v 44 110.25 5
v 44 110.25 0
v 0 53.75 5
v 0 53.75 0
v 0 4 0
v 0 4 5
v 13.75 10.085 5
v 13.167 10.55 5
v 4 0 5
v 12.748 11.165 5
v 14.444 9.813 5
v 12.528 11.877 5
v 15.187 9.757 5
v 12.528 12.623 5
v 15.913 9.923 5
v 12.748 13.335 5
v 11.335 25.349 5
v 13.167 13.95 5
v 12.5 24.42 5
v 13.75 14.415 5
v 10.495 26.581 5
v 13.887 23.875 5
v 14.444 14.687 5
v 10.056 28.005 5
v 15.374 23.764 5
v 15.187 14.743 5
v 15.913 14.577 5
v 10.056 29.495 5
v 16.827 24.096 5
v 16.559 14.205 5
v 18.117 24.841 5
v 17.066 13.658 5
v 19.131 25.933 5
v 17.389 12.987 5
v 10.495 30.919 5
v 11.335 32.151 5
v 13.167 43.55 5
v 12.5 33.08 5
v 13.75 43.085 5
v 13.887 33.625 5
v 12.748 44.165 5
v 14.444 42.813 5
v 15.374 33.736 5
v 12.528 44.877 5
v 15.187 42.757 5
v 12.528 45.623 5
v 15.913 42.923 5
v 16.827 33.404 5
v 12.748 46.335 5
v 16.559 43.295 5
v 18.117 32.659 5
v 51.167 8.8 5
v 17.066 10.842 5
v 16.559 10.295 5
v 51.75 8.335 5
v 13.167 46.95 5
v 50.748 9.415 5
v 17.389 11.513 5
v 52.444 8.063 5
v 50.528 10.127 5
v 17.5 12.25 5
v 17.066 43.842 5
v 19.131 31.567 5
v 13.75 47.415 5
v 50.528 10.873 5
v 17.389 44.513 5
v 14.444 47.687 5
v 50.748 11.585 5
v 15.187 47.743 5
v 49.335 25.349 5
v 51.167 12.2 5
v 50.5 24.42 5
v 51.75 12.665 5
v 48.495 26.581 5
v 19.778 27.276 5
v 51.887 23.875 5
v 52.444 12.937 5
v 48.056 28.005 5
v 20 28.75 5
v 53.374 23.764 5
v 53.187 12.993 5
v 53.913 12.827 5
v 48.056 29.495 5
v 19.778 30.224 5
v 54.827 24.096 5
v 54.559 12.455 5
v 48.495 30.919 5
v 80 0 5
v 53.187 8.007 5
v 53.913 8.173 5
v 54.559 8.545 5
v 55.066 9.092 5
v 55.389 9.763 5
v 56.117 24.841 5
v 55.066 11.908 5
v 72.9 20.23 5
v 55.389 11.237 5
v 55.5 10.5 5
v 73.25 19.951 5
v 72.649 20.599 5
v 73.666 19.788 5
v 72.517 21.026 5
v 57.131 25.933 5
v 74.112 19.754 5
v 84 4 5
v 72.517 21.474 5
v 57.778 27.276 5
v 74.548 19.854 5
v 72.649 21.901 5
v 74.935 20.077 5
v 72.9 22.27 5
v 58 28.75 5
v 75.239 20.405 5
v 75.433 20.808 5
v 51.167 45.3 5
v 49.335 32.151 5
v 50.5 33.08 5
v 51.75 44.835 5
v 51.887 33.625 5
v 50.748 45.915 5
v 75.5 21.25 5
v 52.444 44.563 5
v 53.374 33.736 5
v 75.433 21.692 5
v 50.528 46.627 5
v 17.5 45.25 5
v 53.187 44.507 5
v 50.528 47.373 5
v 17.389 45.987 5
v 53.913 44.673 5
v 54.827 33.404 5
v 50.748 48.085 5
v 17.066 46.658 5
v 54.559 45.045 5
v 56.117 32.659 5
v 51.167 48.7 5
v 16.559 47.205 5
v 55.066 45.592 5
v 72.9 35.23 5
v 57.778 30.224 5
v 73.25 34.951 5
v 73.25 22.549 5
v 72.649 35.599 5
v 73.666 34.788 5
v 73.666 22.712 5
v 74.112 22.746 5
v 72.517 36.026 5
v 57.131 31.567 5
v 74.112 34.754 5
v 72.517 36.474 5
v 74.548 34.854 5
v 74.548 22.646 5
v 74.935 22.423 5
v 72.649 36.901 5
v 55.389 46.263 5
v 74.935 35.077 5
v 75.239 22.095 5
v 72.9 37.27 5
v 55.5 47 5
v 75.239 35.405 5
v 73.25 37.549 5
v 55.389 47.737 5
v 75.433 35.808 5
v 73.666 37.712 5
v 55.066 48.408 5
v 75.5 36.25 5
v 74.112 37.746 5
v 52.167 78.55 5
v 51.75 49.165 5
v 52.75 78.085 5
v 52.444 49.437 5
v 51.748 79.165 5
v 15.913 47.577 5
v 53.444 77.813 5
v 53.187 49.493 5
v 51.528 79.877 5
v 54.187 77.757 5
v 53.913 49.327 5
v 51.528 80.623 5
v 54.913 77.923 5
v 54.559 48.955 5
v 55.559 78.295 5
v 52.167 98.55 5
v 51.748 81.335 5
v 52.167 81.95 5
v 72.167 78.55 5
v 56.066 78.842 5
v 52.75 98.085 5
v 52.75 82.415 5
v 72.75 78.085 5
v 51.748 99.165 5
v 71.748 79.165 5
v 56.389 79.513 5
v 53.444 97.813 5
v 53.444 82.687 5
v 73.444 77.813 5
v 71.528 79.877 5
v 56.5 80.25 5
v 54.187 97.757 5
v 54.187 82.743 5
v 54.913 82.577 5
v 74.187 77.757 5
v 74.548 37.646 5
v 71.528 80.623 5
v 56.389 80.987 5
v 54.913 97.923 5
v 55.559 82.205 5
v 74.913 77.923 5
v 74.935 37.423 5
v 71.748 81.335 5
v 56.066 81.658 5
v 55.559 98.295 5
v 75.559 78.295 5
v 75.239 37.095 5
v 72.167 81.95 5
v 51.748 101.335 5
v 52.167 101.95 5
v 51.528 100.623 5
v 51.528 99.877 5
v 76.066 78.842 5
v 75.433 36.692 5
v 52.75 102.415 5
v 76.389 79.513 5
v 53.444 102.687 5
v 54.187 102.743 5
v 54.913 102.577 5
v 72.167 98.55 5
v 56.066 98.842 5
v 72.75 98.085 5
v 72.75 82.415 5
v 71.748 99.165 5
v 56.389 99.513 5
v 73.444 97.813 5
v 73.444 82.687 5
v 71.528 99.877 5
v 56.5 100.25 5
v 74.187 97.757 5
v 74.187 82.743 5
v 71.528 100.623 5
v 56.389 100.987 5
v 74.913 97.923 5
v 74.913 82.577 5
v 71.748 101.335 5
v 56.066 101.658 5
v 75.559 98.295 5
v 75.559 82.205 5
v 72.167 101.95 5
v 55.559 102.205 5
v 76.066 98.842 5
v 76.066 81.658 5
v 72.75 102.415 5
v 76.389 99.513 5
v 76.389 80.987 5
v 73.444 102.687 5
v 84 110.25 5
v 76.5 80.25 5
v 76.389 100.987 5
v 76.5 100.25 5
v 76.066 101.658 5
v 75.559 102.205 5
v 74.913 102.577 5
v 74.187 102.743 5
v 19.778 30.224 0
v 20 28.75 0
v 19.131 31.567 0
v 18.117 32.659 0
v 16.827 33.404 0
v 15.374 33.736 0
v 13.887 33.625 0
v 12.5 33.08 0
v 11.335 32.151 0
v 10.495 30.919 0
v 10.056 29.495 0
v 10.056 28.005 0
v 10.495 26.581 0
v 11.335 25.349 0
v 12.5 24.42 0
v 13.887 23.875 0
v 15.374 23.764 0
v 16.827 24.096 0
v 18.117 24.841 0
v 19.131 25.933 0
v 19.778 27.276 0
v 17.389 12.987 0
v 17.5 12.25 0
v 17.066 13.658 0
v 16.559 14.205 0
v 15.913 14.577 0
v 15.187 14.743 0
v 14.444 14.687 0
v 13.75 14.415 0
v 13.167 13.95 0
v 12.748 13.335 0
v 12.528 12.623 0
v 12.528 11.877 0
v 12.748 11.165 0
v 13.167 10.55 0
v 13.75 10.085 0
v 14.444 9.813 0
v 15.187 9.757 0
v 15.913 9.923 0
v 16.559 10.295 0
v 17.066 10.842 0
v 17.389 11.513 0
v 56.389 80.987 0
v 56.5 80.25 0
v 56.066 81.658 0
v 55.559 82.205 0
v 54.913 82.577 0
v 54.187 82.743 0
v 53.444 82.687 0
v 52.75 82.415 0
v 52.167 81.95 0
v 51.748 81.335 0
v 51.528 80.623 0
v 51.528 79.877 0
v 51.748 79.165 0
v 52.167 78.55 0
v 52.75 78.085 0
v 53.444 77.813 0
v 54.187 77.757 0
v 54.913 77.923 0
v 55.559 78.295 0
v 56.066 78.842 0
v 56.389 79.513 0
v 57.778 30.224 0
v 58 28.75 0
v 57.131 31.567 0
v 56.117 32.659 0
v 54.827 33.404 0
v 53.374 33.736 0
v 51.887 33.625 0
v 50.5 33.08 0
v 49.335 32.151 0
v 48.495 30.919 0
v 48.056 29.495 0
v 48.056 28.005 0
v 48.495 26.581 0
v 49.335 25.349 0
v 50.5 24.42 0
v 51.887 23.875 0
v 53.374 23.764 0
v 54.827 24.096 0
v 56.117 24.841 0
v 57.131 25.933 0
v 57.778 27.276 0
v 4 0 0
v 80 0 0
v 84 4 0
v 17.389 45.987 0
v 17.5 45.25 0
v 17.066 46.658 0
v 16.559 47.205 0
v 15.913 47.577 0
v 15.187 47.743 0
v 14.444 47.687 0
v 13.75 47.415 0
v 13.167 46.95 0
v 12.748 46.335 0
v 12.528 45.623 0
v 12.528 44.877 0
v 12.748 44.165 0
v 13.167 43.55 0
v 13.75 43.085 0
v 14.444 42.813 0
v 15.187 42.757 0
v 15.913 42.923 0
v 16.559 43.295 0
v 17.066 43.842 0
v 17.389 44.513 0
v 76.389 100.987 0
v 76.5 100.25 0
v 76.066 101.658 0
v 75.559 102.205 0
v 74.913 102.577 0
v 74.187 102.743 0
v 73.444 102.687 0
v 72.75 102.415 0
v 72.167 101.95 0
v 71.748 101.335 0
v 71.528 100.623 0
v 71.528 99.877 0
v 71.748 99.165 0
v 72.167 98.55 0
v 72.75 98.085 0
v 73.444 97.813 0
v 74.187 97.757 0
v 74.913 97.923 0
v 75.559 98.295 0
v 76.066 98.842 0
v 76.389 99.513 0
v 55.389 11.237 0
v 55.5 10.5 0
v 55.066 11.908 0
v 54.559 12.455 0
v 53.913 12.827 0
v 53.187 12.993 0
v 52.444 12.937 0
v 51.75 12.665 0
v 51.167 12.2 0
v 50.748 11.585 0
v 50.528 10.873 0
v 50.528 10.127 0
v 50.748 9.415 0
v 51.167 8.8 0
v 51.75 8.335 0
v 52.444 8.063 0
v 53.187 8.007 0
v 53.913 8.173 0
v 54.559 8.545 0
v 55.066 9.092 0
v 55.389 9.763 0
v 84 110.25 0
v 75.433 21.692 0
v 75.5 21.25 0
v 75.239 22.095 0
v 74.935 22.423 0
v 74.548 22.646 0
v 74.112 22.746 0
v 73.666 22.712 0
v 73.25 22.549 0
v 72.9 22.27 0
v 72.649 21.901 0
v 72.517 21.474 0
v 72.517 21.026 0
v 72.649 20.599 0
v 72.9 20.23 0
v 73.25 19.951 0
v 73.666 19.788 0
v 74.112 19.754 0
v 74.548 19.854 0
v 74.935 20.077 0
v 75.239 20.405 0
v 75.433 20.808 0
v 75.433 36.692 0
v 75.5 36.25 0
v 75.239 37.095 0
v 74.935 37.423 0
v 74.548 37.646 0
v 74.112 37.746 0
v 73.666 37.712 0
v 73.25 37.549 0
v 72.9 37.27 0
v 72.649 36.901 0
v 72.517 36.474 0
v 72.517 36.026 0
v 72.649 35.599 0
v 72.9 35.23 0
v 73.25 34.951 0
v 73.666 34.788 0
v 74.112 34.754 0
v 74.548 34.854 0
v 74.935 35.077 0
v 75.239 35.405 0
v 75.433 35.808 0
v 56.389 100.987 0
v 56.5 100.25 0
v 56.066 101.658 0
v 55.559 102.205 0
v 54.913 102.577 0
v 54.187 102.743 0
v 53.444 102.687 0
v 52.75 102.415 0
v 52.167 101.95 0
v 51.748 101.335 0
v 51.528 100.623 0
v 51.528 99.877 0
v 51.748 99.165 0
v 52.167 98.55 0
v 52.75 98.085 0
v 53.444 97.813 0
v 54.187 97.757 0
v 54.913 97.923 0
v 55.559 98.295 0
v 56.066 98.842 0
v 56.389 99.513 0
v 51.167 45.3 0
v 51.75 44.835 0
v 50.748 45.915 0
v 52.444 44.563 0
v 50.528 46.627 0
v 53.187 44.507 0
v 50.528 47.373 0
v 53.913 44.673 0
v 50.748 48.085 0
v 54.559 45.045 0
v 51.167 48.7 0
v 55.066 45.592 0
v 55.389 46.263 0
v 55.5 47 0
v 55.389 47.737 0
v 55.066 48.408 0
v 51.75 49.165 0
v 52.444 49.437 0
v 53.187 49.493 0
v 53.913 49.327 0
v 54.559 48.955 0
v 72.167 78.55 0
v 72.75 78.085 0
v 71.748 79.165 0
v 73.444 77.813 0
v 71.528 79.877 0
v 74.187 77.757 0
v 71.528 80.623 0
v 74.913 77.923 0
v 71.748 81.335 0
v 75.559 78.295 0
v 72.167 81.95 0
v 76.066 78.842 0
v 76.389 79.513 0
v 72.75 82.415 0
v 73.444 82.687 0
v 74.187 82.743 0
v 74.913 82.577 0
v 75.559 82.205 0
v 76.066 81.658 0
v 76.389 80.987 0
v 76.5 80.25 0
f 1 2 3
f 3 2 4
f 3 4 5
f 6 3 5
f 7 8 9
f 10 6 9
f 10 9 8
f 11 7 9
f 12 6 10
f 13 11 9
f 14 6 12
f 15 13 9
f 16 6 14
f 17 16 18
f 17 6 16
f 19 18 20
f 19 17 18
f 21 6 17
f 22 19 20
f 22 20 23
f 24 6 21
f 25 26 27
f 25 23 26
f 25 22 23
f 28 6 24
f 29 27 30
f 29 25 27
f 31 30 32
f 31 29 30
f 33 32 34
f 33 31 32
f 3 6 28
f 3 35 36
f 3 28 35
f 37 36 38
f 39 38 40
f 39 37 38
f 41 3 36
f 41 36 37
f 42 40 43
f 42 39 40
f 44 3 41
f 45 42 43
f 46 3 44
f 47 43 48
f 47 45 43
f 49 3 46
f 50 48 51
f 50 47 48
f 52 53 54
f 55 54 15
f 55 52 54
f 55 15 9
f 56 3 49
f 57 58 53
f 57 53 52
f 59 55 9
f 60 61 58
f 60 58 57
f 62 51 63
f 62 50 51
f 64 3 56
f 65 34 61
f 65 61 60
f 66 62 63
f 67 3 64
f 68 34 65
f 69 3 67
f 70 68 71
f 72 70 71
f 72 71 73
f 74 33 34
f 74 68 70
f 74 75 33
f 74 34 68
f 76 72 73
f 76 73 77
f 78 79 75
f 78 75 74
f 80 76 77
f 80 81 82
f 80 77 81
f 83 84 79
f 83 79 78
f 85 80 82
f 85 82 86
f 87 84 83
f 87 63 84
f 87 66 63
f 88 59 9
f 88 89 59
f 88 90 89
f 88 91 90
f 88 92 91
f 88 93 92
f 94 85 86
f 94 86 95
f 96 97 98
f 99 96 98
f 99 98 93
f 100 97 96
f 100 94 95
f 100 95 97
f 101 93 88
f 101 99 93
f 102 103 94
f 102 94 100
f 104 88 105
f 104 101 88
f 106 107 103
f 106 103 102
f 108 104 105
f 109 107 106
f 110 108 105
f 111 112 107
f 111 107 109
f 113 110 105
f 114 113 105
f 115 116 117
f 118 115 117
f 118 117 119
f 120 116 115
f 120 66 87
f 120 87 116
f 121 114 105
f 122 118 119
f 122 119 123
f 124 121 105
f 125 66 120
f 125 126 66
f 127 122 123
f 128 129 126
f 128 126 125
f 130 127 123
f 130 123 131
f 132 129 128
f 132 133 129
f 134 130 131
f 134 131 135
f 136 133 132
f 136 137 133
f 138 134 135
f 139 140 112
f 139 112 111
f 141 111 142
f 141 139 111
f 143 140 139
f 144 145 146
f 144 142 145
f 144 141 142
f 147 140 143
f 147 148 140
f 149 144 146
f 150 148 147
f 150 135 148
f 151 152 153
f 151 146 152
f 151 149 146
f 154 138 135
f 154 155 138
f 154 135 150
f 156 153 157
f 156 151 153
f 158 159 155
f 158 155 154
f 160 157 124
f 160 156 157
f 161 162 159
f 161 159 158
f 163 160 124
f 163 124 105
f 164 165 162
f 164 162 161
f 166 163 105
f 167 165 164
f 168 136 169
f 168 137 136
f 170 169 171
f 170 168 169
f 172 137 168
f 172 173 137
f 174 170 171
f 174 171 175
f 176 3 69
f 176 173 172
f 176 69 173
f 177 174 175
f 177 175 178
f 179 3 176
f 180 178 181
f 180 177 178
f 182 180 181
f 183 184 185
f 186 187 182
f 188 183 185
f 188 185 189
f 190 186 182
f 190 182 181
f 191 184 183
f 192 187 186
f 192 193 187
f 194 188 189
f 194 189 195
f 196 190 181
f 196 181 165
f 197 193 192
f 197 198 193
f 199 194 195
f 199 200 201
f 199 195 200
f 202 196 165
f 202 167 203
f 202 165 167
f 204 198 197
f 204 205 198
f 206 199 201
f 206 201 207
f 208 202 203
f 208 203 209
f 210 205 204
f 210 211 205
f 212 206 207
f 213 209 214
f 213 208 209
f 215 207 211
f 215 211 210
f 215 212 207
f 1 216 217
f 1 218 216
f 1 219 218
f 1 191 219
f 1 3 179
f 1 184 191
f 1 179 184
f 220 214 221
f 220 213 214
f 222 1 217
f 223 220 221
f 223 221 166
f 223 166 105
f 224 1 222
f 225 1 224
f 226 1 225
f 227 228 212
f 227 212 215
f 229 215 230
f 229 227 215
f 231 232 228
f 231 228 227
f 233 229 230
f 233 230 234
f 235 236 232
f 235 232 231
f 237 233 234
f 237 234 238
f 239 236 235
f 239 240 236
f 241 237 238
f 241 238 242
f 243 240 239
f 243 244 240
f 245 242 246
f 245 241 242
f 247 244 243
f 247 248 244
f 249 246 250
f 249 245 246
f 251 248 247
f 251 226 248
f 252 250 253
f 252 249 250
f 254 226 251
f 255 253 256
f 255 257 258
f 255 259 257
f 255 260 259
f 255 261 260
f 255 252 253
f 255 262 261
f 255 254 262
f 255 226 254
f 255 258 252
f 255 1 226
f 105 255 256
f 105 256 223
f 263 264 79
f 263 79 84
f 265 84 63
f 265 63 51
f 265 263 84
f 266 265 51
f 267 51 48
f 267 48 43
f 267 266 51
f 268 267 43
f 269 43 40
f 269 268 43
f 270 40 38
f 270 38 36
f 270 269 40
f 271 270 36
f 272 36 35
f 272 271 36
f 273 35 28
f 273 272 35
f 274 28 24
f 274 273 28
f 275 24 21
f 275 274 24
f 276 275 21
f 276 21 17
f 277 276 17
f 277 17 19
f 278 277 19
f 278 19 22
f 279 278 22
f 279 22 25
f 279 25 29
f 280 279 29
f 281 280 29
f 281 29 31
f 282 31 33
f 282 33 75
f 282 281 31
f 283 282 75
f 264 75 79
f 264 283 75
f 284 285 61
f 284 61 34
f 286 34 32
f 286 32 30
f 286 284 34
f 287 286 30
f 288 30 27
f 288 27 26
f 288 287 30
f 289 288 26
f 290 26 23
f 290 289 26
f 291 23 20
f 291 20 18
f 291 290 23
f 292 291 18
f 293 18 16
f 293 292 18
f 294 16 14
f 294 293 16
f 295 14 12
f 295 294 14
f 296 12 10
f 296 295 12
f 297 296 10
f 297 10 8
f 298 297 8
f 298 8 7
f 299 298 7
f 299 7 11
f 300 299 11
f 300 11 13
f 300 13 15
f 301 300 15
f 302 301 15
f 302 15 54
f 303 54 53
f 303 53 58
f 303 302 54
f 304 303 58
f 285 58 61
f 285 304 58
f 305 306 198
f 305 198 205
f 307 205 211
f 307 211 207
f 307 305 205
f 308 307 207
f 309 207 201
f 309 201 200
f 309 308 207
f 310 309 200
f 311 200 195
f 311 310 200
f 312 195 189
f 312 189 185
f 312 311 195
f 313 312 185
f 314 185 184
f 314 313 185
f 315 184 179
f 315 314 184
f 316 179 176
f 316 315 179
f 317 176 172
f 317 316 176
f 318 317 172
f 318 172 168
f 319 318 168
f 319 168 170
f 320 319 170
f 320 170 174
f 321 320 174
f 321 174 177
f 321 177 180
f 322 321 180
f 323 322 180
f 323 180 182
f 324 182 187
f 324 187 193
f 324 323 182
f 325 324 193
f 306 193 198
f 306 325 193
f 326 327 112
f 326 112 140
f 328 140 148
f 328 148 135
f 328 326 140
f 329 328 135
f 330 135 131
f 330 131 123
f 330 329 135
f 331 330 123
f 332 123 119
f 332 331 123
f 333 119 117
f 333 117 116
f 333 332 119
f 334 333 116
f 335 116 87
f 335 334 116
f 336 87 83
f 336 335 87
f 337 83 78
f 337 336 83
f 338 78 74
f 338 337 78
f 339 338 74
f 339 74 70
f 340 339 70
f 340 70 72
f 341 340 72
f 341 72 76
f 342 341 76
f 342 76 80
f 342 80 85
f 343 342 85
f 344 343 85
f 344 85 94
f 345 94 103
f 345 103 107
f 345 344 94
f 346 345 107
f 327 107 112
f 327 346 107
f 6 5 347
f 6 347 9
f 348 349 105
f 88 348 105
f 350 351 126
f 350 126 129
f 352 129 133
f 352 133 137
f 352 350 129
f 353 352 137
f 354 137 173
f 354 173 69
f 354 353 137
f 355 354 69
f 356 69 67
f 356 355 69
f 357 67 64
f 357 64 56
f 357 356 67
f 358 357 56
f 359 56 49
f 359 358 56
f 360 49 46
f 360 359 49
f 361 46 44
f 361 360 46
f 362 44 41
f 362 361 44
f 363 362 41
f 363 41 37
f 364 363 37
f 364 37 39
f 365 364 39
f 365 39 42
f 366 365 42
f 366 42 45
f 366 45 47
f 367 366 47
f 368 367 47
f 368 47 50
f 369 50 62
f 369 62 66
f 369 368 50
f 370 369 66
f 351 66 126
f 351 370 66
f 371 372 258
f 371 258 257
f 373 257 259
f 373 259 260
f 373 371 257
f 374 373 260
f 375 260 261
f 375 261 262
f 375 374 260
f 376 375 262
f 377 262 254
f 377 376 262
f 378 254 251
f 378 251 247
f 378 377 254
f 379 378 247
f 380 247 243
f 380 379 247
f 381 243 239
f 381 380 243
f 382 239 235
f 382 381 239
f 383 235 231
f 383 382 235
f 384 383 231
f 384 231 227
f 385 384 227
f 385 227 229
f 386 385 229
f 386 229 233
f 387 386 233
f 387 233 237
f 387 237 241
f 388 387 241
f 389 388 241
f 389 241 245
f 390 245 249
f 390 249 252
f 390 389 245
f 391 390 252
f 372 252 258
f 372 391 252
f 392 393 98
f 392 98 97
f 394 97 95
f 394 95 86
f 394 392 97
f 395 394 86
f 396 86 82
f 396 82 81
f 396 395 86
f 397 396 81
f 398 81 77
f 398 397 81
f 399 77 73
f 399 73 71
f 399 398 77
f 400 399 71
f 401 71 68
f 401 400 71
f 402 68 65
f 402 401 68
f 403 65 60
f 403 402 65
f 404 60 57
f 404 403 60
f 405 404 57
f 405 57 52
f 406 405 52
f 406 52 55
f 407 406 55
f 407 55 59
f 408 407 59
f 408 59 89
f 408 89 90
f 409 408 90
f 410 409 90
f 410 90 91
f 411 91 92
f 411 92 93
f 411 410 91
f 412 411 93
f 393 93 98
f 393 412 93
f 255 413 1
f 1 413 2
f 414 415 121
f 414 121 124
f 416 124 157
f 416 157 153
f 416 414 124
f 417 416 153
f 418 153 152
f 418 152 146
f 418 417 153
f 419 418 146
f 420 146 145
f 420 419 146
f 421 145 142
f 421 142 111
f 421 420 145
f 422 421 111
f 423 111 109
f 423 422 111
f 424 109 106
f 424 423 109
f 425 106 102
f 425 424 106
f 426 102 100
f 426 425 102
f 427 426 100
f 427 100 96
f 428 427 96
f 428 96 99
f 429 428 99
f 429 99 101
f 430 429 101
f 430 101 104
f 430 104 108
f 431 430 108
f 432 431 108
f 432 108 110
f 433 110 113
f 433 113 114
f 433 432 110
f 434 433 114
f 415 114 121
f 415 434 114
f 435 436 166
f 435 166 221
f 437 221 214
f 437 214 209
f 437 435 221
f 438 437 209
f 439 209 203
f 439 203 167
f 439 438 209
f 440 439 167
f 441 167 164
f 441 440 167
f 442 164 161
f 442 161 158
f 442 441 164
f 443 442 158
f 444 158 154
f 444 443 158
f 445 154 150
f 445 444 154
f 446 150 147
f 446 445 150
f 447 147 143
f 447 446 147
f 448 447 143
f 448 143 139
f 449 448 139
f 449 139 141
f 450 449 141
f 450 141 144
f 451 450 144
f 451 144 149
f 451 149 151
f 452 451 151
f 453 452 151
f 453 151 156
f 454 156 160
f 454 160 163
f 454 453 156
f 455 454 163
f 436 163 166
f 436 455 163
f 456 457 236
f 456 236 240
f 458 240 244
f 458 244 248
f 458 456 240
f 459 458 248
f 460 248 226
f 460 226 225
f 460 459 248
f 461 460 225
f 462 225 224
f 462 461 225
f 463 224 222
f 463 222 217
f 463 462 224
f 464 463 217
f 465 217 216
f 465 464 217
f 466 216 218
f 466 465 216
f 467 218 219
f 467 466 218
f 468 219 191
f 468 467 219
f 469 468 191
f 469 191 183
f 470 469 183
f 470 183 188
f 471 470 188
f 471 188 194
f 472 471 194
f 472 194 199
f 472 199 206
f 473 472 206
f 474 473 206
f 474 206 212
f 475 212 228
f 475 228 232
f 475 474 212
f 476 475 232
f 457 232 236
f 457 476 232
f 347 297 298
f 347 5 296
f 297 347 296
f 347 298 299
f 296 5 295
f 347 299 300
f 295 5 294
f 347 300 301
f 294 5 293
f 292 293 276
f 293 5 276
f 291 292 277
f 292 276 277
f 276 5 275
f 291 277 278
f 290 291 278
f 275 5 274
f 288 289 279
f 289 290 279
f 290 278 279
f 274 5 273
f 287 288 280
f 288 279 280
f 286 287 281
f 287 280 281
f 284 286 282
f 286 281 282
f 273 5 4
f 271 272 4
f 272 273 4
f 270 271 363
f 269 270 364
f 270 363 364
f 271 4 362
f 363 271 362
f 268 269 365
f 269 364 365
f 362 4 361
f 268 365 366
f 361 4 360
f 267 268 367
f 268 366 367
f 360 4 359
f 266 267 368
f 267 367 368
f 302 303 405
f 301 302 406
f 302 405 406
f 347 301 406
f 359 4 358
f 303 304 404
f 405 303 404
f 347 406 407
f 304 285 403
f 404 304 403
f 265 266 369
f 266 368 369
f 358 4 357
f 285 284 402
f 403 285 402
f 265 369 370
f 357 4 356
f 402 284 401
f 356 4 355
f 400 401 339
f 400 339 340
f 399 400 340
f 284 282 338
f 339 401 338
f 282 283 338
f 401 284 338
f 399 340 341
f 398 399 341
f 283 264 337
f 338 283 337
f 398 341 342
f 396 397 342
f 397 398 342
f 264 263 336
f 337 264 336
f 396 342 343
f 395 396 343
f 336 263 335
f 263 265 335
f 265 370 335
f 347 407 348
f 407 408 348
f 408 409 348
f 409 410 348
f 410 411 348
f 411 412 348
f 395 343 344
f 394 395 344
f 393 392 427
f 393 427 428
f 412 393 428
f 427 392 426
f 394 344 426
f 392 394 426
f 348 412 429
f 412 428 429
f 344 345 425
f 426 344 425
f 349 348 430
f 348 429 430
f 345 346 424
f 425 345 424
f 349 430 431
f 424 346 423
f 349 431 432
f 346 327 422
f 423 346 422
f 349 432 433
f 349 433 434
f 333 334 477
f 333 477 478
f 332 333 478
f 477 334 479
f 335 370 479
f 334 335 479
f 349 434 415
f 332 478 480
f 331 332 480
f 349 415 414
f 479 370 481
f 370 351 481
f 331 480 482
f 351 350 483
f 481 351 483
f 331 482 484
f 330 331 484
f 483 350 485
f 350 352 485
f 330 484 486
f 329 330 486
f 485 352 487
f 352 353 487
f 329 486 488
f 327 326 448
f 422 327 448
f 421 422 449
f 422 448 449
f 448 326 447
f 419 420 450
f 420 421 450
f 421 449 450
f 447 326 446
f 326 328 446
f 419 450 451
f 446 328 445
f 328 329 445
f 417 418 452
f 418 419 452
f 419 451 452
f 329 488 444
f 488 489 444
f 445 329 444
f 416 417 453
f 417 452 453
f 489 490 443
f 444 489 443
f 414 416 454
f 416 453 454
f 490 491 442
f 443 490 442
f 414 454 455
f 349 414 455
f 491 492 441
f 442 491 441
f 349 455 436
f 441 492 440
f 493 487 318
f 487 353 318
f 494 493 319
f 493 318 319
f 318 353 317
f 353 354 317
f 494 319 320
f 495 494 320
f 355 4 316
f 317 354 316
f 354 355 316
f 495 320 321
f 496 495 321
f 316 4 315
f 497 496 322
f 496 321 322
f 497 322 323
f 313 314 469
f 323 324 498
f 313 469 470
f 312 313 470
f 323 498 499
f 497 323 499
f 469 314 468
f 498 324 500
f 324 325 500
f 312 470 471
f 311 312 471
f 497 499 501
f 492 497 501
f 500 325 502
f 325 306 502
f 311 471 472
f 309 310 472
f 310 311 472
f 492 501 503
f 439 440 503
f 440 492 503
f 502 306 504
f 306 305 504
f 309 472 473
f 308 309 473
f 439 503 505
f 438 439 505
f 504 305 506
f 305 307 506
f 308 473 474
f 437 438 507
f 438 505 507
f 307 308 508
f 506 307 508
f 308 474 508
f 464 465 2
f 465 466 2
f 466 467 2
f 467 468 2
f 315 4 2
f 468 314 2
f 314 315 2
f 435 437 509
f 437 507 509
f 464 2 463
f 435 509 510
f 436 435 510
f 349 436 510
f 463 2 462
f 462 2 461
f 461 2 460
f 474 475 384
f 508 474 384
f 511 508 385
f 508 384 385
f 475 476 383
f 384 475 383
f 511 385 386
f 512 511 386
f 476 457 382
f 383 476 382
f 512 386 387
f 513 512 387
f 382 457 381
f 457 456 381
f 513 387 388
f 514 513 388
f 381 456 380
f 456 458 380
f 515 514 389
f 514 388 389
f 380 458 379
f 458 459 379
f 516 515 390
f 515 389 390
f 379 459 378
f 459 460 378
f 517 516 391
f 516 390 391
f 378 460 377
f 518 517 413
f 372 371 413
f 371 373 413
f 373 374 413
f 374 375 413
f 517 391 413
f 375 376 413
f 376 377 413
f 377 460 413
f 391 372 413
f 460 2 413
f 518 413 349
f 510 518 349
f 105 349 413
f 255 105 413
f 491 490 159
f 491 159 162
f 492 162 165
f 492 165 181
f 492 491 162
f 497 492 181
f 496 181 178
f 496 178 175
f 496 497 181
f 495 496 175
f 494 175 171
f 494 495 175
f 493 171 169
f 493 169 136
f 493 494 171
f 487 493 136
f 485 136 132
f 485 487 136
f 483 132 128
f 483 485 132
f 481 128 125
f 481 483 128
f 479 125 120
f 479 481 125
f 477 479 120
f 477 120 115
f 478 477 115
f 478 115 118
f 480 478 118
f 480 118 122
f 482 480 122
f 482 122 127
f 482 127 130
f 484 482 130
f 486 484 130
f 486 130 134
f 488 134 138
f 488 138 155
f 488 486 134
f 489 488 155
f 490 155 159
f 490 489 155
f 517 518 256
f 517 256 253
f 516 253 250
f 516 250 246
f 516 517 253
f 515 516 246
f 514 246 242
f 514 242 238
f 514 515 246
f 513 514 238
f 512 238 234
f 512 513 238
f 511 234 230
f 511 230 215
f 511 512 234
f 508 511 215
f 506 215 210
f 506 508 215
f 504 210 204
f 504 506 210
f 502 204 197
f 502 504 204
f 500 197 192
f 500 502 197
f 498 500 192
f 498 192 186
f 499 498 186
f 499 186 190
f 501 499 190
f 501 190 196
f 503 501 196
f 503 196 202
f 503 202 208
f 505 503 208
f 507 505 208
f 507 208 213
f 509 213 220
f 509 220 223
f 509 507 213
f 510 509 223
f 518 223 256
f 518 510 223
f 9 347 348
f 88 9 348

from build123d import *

# Parameters (mm, degrees)
SKETCH_R     = 2.5
SKETCH_R_2   = 5
SKETCH_R_3   = 1.5
PAD_DEPTH    = 5
CHAMFER_SIZE = 4


with BuildPart() as part:
    # Sketch → Pad (new body)
    with BuildSketch(Plane.XY):
        Polygon((84, 110.25), (44, 110.25), (0, 53.75), (0, 0), (84, 0), align=None)
        with Locations((15, 45.25)):
            Circle(SKETCH_R, mode=Mode.SUBTRACT)
        with Locations((15, 12.25)):
            Circle(SKETCH_R, mode=Mode.SUBTRACT)
        with Locations((15, 28.75)):
            Circle(SKETCH_R_2, mode=Mode.SUBTRACT)
        with Locations((53, 47)):
            Circle(SKETCH_R, mode=Mode.SUBTRACT)
        with Locations((53, 28.75)):
            Circle(SKETCH_R_2, mode=Mode.SUBTRACT)
        with Locations((53, 10.5)):
            Circle(SKETCH_R, mode=Mode.SUBTRACT)
        with Locations((54, 80.25)):
            Circle(SKETCH_R, mode=Mode.SUBTRACT)
        with Locations((74, 80.25)):
            Circle(SKETCH_R, mode=Mode.SUBTRACT)
        with Locations((54, 100.25)):
            Circle(SKETCH_R, mode=Mode.SUBTRACT)
        with Locations((74, 100.25)):
            Circle(SKETCH_R, mode=Mode.SUBTRACT)
        with Locations((74, 36.25)):
            Circle(SKETCH_R_3, mode=Mode.SUBTRACT)
        with Locations((74, 21.25)):
            Circle(SKETCH_R_3, mode=Mode.SUBTRACT)
    extrude(amount=PAD_DEPTH)

    # Chamfer
    chamfer_edges = [part.edges().sort_by_distance(p)[0] for p in [
        (0, 0, 2.5),
        (84, 0, 2.5),
    ]]
    chamfer(chamfer_edges, length=CHAMFER_SIZE)


solid = part.part
